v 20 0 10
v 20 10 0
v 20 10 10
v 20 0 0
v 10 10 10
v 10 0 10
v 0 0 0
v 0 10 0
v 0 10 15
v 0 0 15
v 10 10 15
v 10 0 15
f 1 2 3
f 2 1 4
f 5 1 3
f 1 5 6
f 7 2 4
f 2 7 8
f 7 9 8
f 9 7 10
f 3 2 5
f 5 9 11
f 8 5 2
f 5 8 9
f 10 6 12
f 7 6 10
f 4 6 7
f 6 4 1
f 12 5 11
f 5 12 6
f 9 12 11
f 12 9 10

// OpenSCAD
// 
cube([20,10,10]);

translate([0,0,10])
    cube([10,10,5]);
//
